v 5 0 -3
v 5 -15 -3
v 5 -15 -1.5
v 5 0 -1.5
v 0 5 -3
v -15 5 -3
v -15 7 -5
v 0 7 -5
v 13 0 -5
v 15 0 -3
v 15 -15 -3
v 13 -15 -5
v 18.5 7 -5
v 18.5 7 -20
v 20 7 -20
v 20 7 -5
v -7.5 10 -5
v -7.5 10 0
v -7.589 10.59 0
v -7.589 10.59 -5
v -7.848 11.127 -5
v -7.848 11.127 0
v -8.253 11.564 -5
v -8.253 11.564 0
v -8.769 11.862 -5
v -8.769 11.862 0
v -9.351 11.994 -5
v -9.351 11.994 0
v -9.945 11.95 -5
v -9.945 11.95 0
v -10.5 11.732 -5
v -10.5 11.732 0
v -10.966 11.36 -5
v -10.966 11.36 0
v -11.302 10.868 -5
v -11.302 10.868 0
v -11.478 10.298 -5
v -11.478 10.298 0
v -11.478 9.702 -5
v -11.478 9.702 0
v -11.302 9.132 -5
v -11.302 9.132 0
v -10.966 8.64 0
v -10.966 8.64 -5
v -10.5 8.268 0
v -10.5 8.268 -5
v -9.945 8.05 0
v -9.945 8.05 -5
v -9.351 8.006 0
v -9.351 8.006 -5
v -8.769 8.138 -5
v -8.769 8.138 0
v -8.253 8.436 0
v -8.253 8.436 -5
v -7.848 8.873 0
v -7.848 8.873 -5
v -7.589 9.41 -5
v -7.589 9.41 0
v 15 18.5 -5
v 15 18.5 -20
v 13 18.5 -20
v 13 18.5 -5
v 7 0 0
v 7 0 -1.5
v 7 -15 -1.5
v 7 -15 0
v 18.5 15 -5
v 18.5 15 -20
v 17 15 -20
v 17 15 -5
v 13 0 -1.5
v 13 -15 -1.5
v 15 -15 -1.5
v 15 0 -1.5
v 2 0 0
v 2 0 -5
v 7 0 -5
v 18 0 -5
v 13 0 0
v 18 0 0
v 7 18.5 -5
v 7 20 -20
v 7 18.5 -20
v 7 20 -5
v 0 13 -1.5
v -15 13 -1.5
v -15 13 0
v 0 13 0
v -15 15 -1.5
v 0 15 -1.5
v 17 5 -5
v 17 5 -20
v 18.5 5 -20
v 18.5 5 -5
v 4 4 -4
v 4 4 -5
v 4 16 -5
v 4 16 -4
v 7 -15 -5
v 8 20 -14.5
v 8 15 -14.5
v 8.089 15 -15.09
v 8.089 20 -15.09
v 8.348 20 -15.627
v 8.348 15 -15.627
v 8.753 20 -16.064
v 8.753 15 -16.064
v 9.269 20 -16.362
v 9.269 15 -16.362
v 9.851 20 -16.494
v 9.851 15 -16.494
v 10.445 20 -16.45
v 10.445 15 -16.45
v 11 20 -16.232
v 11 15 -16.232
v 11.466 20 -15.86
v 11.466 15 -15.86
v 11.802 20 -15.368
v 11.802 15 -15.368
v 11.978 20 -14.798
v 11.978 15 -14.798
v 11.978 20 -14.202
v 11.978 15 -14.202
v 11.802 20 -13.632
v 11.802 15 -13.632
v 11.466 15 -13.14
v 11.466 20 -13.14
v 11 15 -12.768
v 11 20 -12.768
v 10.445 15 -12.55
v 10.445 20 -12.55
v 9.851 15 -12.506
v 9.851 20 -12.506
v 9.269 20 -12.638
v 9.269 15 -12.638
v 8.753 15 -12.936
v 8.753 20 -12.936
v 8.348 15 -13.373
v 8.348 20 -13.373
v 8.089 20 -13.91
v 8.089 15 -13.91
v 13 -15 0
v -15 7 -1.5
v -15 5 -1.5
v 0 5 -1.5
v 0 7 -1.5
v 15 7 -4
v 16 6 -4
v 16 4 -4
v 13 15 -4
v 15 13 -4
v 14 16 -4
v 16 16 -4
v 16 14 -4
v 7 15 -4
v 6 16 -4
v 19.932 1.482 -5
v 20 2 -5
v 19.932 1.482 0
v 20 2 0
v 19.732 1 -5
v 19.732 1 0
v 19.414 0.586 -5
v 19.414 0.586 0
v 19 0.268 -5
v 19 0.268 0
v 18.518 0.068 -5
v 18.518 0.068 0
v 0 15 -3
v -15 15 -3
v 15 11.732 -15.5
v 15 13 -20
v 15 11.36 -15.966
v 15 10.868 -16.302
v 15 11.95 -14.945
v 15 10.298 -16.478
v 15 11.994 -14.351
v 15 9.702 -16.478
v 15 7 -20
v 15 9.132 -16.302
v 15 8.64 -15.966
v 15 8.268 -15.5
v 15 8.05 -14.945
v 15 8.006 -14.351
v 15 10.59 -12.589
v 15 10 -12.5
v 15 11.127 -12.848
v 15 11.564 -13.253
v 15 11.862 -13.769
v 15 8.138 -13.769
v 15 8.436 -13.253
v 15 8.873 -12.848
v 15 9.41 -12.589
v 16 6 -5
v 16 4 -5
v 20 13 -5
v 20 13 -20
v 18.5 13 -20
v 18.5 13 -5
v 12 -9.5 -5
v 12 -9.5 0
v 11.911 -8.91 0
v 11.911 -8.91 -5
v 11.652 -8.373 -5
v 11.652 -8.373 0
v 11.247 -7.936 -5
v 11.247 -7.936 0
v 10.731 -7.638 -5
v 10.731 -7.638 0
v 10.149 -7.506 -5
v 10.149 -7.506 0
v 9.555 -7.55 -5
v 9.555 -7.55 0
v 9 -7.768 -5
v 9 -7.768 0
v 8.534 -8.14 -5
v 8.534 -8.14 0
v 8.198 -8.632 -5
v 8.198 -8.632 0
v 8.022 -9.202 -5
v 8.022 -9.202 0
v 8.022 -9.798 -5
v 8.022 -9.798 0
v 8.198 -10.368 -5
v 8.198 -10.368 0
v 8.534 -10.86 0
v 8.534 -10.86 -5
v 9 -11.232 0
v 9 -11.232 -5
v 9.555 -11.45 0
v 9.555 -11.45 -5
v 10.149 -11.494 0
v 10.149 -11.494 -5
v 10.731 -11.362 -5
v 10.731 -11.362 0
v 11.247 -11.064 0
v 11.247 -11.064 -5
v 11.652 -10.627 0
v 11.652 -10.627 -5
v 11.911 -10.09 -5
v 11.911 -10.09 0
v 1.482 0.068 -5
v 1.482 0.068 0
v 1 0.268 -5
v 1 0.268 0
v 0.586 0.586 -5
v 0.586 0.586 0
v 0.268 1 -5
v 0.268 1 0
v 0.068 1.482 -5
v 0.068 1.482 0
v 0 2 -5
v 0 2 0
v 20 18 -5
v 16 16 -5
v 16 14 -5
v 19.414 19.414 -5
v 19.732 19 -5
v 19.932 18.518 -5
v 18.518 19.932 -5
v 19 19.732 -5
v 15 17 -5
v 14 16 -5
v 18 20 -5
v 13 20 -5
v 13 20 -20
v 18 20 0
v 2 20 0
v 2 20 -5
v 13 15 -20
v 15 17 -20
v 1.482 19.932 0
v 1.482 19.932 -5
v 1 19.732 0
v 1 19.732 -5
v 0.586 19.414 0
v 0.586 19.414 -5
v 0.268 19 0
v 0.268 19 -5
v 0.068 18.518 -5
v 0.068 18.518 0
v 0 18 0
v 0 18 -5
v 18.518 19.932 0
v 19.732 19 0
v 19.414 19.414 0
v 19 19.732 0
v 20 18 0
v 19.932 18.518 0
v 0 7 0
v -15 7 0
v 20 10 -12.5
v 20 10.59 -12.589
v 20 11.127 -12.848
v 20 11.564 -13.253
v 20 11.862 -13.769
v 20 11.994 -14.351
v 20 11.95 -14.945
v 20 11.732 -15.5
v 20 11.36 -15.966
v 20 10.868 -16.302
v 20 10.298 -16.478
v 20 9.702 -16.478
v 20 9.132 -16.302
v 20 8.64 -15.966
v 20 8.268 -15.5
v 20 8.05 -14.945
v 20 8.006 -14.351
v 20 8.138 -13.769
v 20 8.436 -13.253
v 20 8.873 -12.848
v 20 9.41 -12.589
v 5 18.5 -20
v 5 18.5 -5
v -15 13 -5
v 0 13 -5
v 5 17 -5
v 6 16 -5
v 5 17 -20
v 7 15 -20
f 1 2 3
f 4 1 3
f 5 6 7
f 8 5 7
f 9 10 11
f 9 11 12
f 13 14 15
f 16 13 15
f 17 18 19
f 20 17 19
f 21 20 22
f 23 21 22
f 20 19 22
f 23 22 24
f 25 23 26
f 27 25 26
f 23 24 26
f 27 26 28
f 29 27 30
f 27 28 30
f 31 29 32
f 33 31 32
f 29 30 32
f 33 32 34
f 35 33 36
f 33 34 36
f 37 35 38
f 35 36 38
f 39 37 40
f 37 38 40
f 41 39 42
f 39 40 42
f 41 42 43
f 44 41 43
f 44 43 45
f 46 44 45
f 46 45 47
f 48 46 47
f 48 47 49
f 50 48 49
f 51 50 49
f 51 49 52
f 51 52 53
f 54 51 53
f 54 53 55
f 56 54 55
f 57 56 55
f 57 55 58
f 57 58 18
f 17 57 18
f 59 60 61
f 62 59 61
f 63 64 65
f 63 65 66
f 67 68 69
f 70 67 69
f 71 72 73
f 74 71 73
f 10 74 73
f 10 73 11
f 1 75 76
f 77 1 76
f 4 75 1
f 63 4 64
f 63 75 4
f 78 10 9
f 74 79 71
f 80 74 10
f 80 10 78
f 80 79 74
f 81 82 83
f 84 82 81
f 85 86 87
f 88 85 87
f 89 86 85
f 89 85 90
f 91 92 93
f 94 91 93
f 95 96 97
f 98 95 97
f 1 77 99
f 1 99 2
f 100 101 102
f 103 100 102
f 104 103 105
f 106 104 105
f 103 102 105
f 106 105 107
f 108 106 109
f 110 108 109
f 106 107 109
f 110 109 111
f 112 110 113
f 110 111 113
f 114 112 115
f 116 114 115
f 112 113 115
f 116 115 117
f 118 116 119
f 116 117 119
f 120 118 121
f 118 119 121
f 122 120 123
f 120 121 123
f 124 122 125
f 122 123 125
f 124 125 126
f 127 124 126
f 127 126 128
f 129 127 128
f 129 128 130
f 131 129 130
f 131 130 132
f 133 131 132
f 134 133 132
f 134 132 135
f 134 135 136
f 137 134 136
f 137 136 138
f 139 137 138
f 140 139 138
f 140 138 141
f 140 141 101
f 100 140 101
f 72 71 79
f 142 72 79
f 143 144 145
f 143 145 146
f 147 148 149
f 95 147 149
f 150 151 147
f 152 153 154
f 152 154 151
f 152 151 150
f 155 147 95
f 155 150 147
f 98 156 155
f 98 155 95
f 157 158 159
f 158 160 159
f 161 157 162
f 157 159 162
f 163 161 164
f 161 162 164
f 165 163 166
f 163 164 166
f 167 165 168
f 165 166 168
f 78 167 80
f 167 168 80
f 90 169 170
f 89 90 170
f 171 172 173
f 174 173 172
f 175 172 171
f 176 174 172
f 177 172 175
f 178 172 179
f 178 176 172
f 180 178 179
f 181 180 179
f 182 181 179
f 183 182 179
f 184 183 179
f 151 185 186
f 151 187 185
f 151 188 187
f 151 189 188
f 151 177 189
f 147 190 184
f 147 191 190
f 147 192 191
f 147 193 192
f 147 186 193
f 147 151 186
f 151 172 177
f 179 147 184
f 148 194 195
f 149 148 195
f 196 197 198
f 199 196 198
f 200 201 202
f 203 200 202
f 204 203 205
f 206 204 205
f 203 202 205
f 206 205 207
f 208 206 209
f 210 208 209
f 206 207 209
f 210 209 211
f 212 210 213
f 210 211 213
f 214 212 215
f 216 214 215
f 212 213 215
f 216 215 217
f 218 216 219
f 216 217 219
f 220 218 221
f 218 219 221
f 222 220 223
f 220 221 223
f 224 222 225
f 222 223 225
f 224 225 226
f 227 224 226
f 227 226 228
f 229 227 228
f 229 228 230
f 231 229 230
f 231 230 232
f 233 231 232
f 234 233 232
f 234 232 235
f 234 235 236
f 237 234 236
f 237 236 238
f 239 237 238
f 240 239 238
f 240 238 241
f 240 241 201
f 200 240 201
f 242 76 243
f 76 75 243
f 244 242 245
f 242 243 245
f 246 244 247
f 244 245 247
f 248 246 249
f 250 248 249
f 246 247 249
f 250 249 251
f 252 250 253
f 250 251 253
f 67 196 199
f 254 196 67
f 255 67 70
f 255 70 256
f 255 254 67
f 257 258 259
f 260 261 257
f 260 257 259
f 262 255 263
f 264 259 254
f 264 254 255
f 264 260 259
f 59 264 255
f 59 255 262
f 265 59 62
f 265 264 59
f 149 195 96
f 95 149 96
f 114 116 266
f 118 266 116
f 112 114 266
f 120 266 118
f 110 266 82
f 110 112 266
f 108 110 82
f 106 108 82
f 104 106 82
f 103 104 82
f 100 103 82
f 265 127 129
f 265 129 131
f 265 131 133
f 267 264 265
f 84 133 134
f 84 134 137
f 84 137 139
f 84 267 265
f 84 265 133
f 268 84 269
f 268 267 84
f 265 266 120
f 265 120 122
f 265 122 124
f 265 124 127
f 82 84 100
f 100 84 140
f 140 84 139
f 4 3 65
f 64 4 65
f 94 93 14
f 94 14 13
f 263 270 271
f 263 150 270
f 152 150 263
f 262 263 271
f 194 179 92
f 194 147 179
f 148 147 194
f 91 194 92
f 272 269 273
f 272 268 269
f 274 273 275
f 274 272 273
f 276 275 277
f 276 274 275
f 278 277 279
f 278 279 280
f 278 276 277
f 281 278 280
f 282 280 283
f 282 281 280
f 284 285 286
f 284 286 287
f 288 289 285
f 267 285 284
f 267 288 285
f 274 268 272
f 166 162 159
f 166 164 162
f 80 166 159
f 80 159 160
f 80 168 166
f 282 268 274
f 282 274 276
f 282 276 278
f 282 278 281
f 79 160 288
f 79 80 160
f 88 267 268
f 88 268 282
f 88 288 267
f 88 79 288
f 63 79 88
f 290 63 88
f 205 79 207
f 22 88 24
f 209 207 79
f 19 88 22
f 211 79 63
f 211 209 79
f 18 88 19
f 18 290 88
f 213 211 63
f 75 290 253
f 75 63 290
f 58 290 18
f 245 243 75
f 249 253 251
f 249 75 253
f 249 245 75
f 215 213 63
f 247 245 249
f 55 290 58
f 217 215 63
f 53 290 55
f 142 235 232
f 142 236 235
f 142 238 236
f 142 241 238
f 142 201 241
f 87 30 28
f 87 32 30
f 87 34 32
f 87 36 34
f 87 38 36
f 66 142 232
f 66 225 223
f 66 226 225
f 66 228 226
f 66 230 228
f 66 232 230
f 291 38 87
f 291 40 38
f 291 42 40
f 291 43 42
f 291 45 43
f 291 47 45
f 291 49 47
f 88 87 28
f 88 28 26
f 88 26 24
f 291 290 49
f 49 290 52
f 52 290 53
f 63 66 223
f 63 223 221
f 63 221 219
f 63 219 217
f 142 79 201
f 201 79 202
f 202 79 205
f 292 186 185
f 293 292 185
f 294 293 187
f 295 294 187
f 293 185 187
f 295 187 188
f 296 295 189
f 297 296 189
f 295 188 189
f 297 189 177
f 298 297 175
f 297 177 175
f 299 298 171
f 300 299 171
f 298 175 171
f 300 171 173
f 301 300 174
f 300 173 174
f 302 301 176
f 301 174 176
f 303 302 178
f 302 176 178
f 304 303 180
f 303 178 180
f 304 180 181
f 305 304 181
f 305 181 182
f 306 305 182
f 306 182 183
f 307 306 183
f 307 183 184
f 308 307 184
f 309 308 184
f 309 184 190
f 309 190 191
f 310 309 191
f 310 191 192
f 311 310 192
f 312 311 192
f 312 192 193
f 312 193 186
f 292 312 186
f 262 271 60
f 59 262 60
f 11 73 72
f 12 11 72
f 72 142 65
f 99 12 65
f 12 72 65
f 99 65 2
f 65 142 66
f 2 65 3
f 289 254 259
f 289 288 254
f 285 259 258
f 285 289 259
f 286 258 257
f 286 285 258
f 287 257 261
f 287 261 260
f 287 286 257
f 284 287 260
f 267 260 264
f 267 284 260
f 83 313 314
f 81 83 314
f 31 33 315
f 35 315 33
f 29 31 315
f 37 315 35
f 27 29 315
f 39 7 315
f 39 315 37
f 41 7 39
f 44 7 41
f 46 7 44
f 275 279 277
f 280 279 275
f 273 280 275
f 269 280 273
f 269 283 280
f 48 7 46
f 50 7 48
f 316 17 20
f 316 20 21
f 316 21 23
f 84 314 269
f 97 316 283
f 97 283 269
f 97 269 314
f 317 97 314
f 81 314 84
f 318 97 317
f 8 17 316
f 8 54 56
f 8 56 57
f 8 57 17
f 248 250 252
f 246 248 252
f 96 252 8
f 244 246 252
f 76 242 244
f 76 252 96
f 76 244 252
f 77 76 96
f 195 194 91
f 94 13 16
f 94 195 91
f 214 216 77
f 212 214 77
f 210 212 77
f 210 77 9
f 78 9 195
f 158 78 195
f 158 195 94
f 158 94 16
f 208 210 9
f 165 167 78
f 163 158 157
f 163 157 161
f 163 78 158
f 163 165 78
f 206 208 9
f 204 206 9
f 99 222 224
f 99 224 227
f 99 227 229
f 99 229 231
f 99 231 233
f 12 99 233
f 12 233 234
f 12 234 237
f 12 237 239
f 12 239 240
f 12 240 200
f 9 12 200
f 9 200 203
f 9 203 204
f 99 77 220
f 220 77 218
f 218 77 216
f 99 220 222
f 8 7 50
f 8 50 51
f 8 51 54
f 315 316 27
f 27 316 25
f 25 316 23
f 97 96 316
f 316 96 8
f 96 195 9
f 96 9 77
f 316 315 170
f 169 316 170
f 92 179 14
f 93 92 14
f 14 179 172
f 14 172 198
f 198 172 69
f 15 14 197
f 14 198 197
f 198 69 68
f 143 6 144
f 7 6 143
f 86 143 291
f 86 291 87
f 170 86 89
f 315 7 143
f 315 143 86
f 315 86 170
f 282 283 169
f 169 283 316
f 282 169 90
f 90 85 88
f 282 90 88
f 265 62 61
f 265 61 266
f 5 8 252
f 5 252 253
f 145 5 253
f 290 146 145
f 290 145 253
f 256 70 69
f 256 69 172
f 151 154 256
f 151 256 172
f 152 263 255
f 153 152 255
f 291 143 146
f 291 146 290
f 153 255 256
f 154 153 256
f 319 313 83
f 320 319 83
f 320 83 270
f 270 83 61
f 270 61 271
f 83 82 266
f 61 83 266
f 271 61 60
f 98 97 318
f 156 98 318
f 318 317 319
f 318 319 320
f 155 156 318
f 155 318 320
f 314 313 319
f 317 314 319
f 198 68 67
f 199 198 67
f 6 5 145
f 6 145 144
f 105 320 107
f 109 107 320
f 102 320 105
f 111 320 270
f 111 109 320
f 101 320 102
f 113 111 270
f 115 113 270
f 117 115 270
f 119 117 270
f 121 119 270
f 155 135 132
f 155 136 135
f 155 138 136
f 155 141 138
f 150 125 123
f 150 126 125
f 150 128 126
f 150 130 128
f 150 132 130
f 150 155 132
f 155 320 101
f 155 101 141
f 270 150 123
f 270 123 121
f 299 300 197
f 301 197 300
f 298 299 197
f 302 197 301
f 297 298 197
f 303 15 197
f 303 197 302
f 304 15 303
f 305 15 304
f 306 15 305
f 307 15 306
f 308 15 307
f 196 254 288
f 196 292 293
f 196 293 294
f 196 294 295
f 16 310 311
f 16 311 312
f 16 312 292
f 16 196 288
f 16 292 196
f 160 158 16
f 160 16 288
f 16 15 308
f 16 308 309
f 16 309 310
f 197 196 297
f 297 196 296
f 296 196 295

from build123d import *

# Parameters (mm, degrees)
SKETCH1_W                 = 35.000000224
SKETCH1_H                 = 10
BOSS_EXTRUDE1_DEPTH       = 5
CUT_EXTRUDE1_DEPTH        = 15.000000224
SKETCH3_W                 = 20
SKETCH3_H                 = 5
BOSS_EXTRUDE2_DEPTH       = 5
CUT_EXTRUDE2_DEPTH        = 15.000000224
SKETCH5_W                 = 20
SKETCH5_H                 = 5
BOSS_EXTRUDE3_DEPTH       = 5
BOSS_EXTRUDE4_DEPTH       = 15
BOSS_EXTRUDE5_DEPTH       = 15
BOSS_EXTRUDE6_DEPTH       = 15
CUT_EXTRUDE3_DEPTH        = 1
SKETCH10_W                = 15
SKETCH10_H                = 1.5
CUT_EXTRUDE4_DEPTH        = 2.000000104
SKETCH11_W                = 2.000000194
SKETCH11_H                = 1.5
CUT_EXTRUDE5_DEPTH        = 15
SKETCH12_W                = 1.5
SKETCH12_H                = 2
CUT_EXTRUDE6_DEPTH        = 15.000000224
SKETCH13_W                = 1.5
SKETCH13_H                = 2.000000104
CUT_EXTRUDE7_DEPTH        = 15.000000224
SKETCH14_W                = 1.999999806
SKETCH14_H                = 1.5
CUT_EXTRUDE8_DEPTH        = 15
SKETCH15_W                = 1.5
SKETCH15_H                = 15
CUT_EXTRUDE9_DEPTH        = 2.000000104
SKETCH16_W                = 1.5
SKETCH16_H                = 15
CUT_EXTRUDE10_DEPTH       = 2
SKETCH17_W                = 1.999999806
SKETCH17_H                = 1.5
CUT_EXTRUDE11_DEPTH       = 15
F_6_CLEARANCE_HOLE1_D     = 4
F_6_CLEARANCE_HOLE1_DEPTH = 5
F_6_CLEARANCE_HOLE2_D     = 4
F_6_CLEARANCE_HOLE2_DEPTH = 35
F_6_CLEARANCE_HOLE3_D     = 4
F_6_CLEARANCE_HOLE3_DEPTH = 35.000000224
FILLET1_R                 = 2


with BuildPart() as part:
    # Sketch1 → Boss-Extrude1 (new body)
    with BuildSketch(Plane(origin=(0, 0, -5), x_dir=(-1, 0, 0), z_dir=(0, 0, -1))):
        with Locations((-2.499999888, 10)):
            Rectangle(SKETCH1_W, SKETCH1_H)
    extrude(amount=-BOSS_EXTRUDE1_DEPTH)

    # Sketch2 → Cut-Extrude1 (cut)
    with BuildSketch(Plane.ZY.offset(15.000000224)):
        Polygon((-3, 5), (-5, 7), (-5, 5), align=None)
    extrude(amount=-CUT_EXTRUDE1_DEPTH, mode=Mode.SUBTRACT)

    # Sketch3 → Boss-Extrude2 (add)
    with BuildSketch(Plane.XZ.offset(-5)):
        with Locations((10, -2.5)):
            Rectangle(SKETCH3_W, SKETCH3_H)
    extrude(amount=BOSS_EXTRUDE2_DEPTH)

    # Sketch4 → Cut-Extrude2 (cut)
    with BuildSketch(Plane.ZY.offset(15.000000224)):
        Polygon((-5, 13), (-3, 15), (-5, 15), align=None)
    extrude(amount=-CUT_EXTRUDE2_DEPTH, mode=Mode.SUBTRACT)

    # Sketch5 → Boss-Extrude3 (add)
    with BuildSketch(Plane(origin=(0, 15, 0), x_dir=(-1, 0, 0), z_dir=(0, 1, 0))):
        with Locations((-10, -2.5)):
            Rectangle(SKETCH5_W, SKETCH5_H)
    extrude(amount=BOSS_EXTRUDE3_DEPTH)

    # Sketch6 → Boss-Extrude4 (add)
    with BuildSketch(Plane.XZ):
        Polygon((15, 0), (15, -3), (13, -5), (7, -5), (5, -3), (5, 0), align=None)
    extrude(amount=BOSS_EXTRUDE4_DEPTH)

    # Sketch7 → Boss-Extrude5 (add)
    with BuildSketch(Plane(origin=(0, 0, -5), x_dir=(-1, 0, 0), z_dir=(0, 0, -1))):
        Polygon((-5, 20), (-5, 17), (-7, 15), (-13, 15), (-15, 17), (-15, 20), align=None)
    extrude(amount=BOSS_EXTRUDE5_DEPTH)

    # Sketch8 → Boss-Extrude6 (add)
    with BuildSketch(Plane(origin=(0, 0, -5), x_dir=(-1, 0, 0), z_dir=(0, 0, -1))):
        Polygon((-20, 5), (-20, 15), (-17, 15), (-15, 13), (-15, 7), (-17, 5), align=None)
    extrude(amount=BOSS_EXTRUDE6_DEPTH)

    # Sketch9 → Cut-Extrude3 (cut)
    with BuildSketch(Plane(origin=(0, 0, -5), x_dir=(-1, 0, 0), z_dir=(0, 0, -1))):
        Polygon((-16.000000238, 16), (-16.000000238, 14.000000238), (-15, 13), (-15, 7), (-16.000000238, 5.999999762), (-16.000000238, 4), (-4, 4), (-4, 16), (-6, 16), (-7, 15), (-13, 15), (-14, 16), align=None)
    extrude(amount=-CUT_EXTRUDE3_DEPTH, mode=Mode.SUBTRACT)

    # Sketch10 → Cut-Extrude4 (cut)
    with BuildSketch(Plane.ZY.offset(-5)):
        with Locations((-12.5, 19.25)):
            Rectangle(SKETCH10_W, SKETCH10_H)
    extrude(amount=-CUT_EXTRUDE4_DEPTH, mode=Mode.SUBTRACT)

    # Sketch11 → Cut-Extrude5 (cut)
    with BuildSketch(Plane.XZ.offset(15)):
        with Locations((6.000000097, -0.75)):
            Rectangle(SKETCH11_W, SKETCH11_H)
    extrude(amount=-CUT_EXTRUDE5_DEPTH, mode=Mode.SUBTRACT)

    # Sketch12 → Cut-Extrude6 (cut)
    with BuildSketch(Plane.ZY.offset(15.000000224)):
        with Locations((-0.75, 14)):
            Rectangle(SKETCH12_W, SKETCH12_H)
    extrude(amount=-CUT_EXTRUDE6_DEPTH, mode=Mode.SUBTRACT)

    # Sketch13 → Cut-Extrude7 (cut)
    with BuildSketch(Plane.ZY.offset(15.000000224)):
        with Locations((-0.75, 6.000000052)):
            Rectangle(SKETCH13_W, SKETCH13_H)
    extrude(amount=-CUT_EXTRUDE7_DEPTH, mode=Mode.SUBTRACT)

    # Sketch14 → Cut-Extrude8 (cut)
    with BuildSketch(Plane.XZ.offset(15)):
        with Locations((14.000000097, -0.75)):
            Rectangle(SKETCH14_W, SKETCH14_H)
    extrude(amount=-CUT_EXTRUDE8_DEPTH, mode=Mode.SUBTRACT)

    # Sketch15 → Cut-Extrude9 (cut)
    with BuildSketch(Plane.XZ.offset(-5)):
        with Locations((19.25, -12.5)):
            Rectangle(SKETCH15_W, SKETCH15_H)
    extrude(amount=-CUT_EXTRUDE9_DEPTH, mode=Mode.SUBTRACT)

    # Sketch16 → Cut-Extrude10 (cut)
    with BuildSketch(Plane(origin=(0, 15, 0), x_dir=(-1, 0, 0), z_dir=(0, 1, 0))):
        with Locations((-19.25, -12.5)):
            Rectangle(SKETCH16_W, SKETCH16_H)
    extrude(amount=-CUT_EXTRUDE10_DEPTH, mode=Mode.SUBTRACT)

    # Sketch17 → Cut-Extrude11 (cut)
    with BuildSketch(Plane(origin=(0, 0, -20), x_dir=(-1, 0, 0), z_dir=(0, 0, -1))):
        with Locations((-14.000000097, 19.25)):
            Rectangle(SKETCH17_W, SKETCH17_H)
    extrude(amount=-CUT_EXTRUDE11_DEPTH, mode=Mode.SUBTRACT)

    # #6 Clearance Hole1
    with Locations(Plane(origin=(0, 0, -5), x_dir=(-1, 0, 0), z_dir=(0, 0, -1))):
        with Locations((-10, -9.5), (9.5, 10)):
            Hole(F_6_CLEARANCE_HOLE1_D / 2, depth=F_6_CLEARANCE_HOLE1_DEPTH)

    # #6 Clearance Hole2
    with Locations(Plane(origin=(0, 20, 0), x_dir=(1, 0, 0), z_dir=(0, 1, 0))):
        with Locations((10.000000149, 14.5)):
            Hole(F_6_CLEARANCE_HOLE2_D / 2, depth=F_6_CLEARANCE_HOLE2_DEPTH)

    # #6 Clearance Hole3
    with Locations(Plane(origin=(20, 0, 0), x_dir=(0, 0, -1), z_dir=(1, 0, 0))):
        with Locations((14.5, 10.000000052)):
            Hole(F_6_CLEARANCE_HOLE3_D / 2, depth=F_6_CLEARANCE_HOLE3_DEPTH)

    # Fillet1
    fillet1_edges = [part.edges().sort_by_distance(p)[0] for p in [
        (20, 0, -2.5),
        (0, 0, -2.5),
        (0, 20, -2.5),
        (20, 20, -2.5),
    ]]
    fillet(fillet1_edges, radius=FILLET1_R)


solid = part.part
